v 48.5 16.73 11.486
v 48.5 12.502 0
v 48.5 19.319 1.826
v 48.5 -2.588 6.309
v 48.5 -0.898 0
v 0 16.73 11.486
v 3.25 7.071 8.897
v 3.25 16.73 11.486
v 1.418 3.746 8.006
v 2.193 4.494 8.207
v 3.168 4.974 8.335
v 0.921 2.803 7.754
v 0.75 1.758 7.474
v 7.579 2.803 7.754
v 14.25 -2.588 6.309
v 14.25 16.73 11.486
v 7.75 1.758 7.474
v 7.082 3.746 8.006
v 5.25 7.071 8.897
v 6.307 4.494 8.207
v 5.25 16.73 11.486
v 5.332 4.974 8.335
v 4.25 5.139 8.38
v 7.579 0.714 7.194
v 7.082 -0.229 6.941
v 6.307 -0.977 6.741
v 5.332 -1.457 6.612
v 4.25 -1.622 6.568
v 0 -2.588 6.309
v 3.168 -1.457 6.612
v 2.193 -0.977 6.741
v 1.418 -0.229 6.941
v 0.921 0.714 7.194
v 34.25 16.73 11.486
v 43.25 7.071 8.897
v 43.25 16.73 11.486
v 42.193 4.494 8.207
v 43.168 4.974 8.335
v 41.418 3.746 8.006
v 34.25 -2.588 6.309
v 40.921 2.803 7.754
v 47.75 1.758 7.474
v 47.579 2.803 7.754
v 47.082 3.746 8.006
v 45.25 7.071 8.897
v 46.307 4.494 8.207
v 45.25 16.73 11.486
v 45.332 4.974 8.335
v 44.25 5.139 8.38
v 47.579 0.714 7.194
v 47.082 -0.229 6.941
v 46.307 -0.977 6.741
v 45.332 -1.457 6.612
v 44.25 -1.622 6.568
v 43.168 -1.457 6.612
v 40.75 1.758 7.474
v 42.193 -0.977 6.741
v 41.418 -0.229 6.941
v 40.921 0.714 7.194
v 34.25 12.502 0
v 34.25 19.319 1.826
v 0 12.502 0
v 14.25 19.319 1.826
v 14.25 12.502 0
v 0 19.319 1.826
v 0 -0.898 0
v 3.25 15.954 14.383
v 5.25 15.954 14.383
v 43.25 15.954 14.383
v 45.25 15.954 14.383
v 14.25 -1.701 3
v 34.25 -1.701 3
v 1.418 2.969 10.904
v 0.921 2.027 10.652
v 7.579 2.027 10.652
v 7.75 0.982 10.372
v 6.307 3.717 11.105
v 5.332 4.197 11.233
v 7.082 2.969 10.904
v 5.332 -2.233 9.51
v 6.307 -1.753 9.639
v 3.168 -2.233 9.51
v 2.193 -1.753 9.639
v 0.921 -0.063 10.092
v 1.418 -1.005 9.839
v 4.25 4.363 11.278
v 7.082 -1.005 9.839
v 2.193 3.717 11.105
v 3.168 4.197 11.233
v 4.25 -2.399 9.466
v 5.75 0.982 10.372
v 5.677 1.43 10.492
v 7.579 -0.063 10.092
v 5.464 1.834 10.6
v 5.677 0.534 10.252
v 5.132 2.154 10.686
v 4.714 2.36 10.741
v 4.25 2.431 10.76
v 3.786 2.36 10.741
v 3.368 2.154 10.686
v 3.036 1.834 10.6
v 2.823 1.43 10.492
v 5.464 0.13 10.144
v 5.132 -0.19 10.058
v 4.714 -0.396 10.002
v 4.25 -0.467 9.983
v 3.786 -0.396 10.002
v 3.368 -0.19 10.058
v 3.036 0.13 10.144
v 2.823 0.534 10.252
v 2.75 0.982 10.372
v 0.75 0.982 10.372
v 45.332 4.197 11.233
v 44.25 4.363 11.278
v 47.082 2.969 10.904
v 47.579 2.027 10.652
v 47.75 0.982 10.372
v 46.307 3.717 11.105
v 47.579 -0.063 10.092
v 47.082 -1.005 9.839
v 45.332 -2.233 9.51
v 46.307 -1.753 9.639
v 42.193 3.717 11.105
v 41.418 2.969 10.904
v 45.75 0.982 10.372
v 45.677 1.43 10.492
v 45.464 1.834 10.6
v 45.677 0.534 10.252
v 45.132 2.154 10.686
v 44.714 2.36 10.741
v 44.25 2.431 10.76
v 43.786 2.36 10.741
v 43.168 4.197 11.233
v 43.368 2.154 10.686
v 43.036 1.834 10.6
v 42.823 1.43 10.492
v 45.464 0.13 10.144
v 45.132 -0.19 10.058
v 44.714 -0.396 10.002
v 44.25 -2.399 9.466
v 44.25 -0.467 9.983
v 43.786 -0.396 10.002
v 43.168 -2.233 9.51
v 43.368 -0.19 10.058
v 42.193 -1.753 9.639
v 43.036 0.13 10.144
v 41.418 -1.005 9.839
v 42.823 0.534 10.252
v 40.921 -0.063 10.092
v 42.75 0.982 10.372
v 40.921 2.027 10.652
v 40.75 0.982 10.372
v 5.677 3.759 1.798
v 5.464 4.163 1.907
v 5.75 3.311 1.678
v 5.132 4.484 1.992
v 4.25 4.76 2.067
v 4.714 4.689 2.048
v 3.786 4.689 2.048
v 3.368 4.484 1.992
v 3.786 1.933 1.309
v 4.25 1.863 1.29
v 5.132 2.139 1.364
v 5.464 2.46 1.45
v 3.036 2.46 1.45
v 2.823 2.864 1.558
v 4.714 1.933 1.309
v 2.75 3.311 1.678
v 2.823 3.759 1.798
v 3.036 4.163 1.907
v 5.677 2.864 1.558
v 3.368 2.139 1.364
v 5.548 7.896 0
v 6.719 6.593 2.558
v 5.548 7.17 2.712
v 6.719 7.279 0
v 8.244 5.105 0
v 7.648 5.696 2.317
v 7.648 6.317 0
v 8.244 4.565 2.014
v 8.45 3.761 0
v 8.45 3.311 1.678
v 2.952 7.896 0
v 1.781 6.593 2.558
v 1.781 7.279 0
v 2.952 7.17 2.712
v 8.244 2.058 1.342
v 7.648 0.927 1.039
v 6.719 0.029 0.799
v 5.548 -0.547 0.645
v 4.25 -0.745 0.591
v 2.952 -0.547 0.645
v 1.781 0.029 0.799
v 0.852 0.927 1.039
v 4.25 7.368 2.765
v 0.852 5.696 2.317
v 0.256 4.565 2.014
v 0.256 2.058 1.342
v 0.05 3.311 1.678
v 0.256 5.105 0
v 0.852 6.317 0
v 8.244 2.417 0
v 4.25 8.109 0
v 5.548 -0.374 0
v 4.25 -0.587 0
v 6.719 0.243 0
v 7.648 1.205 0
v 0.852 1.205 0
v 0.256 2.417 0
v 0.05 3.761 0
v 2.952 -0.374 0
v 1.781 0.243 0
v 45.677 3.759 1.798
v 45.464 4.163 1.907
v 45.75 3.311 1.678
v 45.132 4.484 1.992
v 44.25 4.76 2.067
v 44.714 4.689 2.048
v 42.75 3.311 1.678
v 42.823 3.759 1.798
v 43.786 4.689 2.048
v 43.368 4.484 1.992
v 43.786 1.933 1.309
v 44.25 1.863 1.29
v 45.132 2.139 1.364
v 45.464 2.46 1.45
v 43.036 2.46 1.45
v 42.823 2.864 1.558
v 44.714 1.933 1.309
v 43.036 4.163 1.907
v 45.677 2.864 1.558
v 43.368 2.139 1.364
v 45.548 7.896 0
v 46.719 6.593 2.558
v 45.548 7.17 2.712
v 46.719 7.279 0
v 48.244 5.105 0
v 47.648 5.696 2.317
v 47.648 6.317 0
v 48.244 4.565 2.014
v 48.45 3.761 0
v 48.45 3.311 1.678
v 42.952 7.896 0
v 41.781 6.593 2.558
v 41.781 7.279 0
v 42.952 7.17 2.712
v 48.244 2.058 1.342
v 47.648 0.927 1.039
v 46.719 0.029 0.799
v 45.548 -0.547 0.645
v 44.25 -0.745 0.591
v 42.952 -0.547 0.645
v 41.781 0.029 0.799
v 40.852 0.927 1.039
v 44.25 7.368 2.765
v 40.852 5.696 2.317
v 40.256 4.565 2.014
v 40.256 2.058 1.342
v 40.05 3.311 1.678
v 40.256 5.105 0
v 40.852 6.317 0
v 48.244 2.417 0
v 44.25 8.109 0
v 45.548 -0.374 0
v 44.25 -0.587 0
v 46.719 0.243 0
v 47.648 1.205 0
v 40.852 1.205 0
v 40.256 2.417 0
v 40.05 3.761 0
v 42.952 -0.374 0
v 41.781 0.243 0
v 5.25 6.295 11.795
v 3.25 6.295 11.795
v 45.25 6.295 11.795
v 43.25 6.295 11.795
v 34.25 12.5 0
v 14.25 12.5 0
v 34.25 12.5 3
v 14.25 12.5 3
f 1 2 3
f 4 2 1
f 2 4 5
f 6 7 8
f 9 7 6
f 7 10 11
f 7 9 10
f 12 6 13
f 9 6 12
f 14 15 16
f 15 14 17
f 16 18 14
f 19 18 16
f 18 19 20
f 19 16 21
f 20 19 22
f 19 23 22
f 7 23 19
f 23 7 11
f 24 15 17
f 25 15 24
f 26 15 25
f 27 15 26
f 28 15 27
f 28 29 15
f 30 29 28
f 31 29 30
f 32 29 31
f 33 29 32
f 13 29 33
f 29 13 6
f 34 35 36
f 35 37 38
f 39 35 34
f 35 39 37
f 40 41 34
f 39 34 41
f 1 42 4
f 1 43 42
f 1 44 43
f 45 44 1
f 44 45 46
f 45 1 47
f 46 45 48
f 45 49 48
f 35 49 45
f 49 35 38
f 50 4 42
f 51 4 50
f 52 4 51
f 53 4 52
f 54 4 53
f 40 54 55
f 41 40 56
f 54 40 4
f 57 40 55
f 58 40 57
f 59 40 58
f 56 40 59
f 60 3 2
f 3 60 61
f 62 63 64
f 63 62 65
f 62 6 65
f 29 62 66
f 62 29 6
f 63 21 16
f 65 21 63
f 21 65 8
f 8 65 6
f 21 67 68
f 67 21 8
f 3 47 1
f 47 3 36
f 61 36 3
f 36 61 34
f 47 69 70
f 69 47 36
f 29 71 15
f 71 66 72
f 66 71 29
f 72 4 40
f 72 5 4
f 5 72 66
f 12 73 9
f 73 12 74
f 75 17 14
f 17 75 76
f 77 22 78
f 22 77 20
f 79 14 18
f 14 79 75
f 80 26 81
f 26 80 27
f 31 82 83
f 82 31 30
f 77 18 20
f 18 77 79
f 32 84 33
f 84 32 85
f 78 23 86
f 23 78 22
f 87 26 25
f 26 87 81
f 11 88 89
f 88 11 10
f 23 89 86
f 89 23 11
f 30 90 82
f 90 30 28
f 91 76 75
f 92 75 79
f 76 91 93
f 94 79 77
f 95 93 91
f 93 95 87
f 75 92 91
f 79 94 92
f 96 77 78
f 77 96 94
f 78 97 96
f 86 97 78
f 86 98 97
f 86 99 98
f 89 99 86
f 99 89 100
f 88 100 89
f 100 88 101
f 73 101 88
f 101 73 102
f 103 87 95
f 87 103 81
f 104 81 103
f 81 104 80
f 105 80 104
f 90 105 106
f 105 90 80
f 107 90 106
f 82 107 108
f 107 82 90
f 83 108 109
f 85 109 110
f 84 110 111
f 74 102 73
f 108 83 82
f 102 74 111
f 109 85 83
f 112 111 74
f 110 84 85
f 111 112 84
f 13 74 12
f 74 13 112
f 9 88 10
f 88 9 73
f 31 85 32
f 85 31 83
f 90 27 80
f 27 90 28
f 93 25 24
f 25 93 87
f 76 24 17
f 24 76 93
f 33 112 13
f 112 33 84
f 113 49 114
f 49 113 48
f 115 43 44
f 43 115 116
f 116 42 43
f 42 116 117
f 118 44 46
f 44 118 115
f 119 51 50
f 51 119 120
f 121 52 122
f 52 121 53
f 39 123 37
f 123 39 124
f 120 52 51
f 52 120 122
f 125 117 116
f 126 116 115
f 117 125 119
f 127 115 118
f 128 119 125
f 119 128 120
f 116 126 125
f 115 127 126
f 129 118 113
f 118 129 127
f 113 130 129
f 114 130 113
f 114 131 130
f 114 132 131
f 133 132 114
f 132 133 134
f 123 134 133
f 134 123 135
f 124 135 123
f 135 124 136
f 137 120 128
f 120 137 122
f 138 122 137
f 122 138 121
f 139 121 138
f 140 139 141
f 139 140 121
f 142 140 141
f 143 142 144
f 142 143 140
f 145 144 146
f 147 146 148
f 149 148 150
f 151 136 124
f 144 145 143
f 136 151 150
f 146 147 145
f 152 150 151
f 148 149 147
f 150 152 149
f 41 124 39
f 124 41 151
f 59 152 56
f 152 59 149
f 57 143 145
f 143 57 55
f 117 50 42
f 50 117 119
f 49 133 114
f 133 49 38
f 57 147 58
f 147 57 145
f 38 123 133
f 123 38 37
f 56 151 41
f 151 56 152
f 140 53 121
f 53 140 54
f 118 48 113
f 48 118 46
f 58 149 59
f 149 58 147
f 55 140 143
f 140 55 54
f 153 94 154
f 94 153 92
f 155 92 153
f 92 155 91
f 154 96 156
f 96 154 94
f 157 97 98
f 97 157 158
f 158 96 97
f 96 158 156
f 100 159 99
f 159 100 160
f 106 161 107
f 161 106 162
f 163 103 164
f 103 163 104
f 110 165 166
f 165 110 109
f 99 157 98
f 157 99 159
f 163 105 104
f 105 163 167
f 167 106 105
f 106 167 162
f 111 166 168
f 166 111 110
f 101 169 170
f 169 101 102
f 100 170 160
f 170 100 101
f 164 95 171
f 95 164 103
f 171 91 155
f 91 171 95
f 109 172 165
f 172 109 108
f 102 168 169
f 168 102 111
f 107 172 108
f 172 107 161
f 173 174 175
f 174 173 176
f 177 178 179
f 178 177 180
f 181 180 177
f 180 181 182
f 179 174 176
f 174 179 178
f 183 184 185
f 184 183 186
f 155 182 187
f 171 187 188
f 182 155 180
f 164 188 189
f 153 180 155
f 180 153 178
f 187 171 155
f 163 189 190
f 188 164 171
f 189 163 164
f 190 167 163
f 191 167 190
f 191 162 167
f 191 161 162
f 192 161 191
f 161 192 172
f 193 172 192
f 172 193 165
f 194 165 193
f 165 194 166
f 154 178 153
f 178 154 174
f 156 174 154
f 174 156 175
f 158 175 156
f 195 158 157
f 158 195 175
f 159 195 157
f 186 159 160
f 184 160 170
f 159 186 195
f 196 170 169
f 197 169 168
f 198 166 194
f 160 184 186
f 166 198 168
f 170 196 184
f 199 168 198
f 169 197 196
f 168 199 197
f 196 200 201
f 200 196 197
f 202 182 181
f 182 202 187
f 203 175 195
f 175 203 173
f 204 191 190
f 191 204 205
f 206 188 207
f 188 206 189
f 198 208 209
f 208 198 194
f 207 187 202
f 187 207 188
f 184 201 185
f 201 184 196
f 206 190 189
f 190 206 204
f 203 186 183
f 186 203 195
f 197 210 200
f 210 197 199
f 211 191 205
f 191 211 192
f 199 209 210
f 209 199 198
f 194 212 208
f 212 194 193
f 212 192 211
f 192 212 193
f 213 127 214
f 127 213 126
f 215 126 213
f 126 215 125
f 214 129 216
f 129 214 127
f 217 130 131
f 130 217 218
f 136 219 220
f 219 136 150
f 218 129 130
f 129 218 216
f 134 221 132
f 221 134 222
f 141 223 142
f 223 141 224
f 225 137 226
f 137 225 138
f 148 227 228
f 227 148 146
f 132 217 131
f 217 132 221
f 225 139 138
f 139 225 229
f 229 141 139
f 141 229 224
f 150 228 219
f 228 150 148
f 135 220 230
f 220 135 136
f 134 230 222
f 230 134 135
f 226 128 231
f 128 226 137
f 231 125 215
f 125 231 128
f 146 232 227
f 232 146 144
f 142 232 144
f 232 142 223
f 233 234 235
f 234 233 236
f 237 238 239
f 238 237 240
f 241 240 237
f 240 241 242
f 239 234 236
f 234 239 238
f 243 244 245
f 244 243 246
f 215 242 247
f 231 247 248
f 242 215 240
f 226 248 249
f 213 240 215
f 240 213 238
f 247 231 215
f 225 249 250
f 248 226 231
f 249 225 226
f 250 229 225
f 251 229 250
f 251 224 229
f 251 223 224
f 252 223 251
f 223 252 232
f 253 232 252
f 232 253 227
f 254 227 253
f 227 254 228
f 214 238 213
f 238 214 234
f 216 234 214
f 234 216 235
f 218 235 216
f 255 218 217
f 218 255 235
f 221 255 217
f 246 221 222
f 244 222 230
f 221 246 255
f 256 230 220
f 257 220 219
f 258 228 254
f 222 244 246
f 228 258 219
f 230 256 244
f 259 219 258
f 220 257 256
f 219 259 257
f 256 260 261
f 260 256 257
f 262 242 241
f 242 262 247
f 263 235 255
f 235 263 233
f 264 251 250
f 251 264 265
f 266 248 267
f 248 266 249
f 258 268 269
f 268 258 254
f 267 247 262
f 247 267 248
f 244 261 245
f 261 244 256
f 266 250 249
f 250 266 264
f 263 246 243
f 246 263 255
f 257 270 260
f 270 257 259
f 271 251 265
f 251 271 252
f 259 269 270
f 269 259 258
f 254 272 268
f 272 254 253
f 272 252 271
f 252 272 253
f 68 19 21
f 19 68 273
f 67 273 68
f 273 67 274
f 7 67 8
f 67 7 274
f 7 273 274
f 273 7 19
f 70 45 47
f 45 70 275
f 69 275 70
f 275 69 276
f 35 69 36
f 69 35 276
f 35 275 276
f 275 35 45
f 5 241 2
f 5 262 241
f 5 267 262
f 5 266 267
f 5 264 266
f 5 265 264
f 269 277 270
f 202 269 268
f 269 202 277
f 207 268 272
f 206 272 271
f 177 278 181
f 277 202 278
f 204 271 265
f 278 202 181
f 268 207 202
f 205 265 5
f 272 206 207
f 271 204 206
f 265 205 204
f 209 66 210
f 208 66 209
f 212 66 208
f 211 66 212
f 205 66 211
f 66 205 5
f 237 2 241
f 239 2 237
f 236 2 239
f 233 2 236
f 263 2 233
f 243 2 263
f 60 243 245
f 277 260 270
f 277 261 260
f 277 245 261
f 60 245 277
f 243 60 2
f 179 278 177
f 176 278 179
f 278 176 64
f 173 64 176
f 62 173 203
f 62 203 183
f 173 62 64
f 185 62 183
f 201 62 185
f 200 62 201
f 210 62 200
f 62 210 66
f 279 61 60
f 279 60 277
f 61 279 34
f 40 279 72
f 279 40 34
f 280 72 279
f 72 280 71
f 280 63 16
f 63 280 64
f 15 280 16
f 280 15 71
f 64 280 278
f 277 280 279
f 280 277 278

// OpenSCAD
d_parafusos = 40;
l_placa = 48.5;
c_suporte = 20;
p_suporte = 10;

render( convexity =  10 ) {

    difference() {
        translate( [ 0, 0, -3.35 ] )
            rotate( 15, [ 1, 0, 0 ] ) {
                difference(){
                    union(){
                        cube( [ l_placa, c_suporte, p_suporte ] );
                        translate( [ ( l_placa - d_parafusos ) / 2, 4.5, p_suporte - 1 ] )
                            cylinder( r = 3.5, h = 4, $fn = 20 );
                        translate( [ l_placa - ( l_placa - d_parafusos ) / 2, 4.5, p_suporte - 1 ] )
                            cylinder( r = 3.5, h = 4, $fn = 20 );
                    }
                    translate( [ ( l_placa - d_parafusos ) / 2, 4.5, -1 ] ) {
                        cylinder( r = 1.5, h = p_suporte + 10, $fn = 20 );
                        cylinder( r = 4.2, h = p_suporte - 5, $fn = 20 );
                    }
                    translate( [ l_placa - ( l_placa - d_parafusos ) / 2, 4.5, -1 ] ) {
                        cylinder( r = 1.5, h = p_suporte + 10, $fn = 20 );
                        cylinder( r = 4.2, h = p_suporte - 5, $fn = 20 );
                    }
                }
                
                translate(  [ ( l_placa - d_parafusos ) / 2 - 1, c_suporte - 10, 0 ]  )
                    cube( [ 2, 10, p_suporte + 3 ] );
                translate(  [ l_placa -  ( l_placa - d_parafusos ) / 2 - 1, c_suporte - 10, 0 ]  )
                    cube( [ 2, 10, p_suporte + 3 ] );
                
//                translate( [ ( l_placa - d_parafusos ) / 2, 4.5, p_suporte - 7 ] )
//                    cylinder( r = 2.8, h = 10, $fn = 20 );
            }
        translate( [ -1, -1, -10 ] )
            cube( [ 100, 100, 10 ] );
        translate( [ ( l_placa - 20 ) / 2, -10, 3 ] )
            cube( [ 20, 100, 10 ] );
        translate( [ ( l_placa - 20 ) / 2, 12.5, -1 ] )
            cube( [ 20, 100, 10 ] );
    }
//        translate( [ ( l_placa - 20 ) / 2, 10, -1 ] )
//            cube( [ 20, 100, 10 ] );
}
